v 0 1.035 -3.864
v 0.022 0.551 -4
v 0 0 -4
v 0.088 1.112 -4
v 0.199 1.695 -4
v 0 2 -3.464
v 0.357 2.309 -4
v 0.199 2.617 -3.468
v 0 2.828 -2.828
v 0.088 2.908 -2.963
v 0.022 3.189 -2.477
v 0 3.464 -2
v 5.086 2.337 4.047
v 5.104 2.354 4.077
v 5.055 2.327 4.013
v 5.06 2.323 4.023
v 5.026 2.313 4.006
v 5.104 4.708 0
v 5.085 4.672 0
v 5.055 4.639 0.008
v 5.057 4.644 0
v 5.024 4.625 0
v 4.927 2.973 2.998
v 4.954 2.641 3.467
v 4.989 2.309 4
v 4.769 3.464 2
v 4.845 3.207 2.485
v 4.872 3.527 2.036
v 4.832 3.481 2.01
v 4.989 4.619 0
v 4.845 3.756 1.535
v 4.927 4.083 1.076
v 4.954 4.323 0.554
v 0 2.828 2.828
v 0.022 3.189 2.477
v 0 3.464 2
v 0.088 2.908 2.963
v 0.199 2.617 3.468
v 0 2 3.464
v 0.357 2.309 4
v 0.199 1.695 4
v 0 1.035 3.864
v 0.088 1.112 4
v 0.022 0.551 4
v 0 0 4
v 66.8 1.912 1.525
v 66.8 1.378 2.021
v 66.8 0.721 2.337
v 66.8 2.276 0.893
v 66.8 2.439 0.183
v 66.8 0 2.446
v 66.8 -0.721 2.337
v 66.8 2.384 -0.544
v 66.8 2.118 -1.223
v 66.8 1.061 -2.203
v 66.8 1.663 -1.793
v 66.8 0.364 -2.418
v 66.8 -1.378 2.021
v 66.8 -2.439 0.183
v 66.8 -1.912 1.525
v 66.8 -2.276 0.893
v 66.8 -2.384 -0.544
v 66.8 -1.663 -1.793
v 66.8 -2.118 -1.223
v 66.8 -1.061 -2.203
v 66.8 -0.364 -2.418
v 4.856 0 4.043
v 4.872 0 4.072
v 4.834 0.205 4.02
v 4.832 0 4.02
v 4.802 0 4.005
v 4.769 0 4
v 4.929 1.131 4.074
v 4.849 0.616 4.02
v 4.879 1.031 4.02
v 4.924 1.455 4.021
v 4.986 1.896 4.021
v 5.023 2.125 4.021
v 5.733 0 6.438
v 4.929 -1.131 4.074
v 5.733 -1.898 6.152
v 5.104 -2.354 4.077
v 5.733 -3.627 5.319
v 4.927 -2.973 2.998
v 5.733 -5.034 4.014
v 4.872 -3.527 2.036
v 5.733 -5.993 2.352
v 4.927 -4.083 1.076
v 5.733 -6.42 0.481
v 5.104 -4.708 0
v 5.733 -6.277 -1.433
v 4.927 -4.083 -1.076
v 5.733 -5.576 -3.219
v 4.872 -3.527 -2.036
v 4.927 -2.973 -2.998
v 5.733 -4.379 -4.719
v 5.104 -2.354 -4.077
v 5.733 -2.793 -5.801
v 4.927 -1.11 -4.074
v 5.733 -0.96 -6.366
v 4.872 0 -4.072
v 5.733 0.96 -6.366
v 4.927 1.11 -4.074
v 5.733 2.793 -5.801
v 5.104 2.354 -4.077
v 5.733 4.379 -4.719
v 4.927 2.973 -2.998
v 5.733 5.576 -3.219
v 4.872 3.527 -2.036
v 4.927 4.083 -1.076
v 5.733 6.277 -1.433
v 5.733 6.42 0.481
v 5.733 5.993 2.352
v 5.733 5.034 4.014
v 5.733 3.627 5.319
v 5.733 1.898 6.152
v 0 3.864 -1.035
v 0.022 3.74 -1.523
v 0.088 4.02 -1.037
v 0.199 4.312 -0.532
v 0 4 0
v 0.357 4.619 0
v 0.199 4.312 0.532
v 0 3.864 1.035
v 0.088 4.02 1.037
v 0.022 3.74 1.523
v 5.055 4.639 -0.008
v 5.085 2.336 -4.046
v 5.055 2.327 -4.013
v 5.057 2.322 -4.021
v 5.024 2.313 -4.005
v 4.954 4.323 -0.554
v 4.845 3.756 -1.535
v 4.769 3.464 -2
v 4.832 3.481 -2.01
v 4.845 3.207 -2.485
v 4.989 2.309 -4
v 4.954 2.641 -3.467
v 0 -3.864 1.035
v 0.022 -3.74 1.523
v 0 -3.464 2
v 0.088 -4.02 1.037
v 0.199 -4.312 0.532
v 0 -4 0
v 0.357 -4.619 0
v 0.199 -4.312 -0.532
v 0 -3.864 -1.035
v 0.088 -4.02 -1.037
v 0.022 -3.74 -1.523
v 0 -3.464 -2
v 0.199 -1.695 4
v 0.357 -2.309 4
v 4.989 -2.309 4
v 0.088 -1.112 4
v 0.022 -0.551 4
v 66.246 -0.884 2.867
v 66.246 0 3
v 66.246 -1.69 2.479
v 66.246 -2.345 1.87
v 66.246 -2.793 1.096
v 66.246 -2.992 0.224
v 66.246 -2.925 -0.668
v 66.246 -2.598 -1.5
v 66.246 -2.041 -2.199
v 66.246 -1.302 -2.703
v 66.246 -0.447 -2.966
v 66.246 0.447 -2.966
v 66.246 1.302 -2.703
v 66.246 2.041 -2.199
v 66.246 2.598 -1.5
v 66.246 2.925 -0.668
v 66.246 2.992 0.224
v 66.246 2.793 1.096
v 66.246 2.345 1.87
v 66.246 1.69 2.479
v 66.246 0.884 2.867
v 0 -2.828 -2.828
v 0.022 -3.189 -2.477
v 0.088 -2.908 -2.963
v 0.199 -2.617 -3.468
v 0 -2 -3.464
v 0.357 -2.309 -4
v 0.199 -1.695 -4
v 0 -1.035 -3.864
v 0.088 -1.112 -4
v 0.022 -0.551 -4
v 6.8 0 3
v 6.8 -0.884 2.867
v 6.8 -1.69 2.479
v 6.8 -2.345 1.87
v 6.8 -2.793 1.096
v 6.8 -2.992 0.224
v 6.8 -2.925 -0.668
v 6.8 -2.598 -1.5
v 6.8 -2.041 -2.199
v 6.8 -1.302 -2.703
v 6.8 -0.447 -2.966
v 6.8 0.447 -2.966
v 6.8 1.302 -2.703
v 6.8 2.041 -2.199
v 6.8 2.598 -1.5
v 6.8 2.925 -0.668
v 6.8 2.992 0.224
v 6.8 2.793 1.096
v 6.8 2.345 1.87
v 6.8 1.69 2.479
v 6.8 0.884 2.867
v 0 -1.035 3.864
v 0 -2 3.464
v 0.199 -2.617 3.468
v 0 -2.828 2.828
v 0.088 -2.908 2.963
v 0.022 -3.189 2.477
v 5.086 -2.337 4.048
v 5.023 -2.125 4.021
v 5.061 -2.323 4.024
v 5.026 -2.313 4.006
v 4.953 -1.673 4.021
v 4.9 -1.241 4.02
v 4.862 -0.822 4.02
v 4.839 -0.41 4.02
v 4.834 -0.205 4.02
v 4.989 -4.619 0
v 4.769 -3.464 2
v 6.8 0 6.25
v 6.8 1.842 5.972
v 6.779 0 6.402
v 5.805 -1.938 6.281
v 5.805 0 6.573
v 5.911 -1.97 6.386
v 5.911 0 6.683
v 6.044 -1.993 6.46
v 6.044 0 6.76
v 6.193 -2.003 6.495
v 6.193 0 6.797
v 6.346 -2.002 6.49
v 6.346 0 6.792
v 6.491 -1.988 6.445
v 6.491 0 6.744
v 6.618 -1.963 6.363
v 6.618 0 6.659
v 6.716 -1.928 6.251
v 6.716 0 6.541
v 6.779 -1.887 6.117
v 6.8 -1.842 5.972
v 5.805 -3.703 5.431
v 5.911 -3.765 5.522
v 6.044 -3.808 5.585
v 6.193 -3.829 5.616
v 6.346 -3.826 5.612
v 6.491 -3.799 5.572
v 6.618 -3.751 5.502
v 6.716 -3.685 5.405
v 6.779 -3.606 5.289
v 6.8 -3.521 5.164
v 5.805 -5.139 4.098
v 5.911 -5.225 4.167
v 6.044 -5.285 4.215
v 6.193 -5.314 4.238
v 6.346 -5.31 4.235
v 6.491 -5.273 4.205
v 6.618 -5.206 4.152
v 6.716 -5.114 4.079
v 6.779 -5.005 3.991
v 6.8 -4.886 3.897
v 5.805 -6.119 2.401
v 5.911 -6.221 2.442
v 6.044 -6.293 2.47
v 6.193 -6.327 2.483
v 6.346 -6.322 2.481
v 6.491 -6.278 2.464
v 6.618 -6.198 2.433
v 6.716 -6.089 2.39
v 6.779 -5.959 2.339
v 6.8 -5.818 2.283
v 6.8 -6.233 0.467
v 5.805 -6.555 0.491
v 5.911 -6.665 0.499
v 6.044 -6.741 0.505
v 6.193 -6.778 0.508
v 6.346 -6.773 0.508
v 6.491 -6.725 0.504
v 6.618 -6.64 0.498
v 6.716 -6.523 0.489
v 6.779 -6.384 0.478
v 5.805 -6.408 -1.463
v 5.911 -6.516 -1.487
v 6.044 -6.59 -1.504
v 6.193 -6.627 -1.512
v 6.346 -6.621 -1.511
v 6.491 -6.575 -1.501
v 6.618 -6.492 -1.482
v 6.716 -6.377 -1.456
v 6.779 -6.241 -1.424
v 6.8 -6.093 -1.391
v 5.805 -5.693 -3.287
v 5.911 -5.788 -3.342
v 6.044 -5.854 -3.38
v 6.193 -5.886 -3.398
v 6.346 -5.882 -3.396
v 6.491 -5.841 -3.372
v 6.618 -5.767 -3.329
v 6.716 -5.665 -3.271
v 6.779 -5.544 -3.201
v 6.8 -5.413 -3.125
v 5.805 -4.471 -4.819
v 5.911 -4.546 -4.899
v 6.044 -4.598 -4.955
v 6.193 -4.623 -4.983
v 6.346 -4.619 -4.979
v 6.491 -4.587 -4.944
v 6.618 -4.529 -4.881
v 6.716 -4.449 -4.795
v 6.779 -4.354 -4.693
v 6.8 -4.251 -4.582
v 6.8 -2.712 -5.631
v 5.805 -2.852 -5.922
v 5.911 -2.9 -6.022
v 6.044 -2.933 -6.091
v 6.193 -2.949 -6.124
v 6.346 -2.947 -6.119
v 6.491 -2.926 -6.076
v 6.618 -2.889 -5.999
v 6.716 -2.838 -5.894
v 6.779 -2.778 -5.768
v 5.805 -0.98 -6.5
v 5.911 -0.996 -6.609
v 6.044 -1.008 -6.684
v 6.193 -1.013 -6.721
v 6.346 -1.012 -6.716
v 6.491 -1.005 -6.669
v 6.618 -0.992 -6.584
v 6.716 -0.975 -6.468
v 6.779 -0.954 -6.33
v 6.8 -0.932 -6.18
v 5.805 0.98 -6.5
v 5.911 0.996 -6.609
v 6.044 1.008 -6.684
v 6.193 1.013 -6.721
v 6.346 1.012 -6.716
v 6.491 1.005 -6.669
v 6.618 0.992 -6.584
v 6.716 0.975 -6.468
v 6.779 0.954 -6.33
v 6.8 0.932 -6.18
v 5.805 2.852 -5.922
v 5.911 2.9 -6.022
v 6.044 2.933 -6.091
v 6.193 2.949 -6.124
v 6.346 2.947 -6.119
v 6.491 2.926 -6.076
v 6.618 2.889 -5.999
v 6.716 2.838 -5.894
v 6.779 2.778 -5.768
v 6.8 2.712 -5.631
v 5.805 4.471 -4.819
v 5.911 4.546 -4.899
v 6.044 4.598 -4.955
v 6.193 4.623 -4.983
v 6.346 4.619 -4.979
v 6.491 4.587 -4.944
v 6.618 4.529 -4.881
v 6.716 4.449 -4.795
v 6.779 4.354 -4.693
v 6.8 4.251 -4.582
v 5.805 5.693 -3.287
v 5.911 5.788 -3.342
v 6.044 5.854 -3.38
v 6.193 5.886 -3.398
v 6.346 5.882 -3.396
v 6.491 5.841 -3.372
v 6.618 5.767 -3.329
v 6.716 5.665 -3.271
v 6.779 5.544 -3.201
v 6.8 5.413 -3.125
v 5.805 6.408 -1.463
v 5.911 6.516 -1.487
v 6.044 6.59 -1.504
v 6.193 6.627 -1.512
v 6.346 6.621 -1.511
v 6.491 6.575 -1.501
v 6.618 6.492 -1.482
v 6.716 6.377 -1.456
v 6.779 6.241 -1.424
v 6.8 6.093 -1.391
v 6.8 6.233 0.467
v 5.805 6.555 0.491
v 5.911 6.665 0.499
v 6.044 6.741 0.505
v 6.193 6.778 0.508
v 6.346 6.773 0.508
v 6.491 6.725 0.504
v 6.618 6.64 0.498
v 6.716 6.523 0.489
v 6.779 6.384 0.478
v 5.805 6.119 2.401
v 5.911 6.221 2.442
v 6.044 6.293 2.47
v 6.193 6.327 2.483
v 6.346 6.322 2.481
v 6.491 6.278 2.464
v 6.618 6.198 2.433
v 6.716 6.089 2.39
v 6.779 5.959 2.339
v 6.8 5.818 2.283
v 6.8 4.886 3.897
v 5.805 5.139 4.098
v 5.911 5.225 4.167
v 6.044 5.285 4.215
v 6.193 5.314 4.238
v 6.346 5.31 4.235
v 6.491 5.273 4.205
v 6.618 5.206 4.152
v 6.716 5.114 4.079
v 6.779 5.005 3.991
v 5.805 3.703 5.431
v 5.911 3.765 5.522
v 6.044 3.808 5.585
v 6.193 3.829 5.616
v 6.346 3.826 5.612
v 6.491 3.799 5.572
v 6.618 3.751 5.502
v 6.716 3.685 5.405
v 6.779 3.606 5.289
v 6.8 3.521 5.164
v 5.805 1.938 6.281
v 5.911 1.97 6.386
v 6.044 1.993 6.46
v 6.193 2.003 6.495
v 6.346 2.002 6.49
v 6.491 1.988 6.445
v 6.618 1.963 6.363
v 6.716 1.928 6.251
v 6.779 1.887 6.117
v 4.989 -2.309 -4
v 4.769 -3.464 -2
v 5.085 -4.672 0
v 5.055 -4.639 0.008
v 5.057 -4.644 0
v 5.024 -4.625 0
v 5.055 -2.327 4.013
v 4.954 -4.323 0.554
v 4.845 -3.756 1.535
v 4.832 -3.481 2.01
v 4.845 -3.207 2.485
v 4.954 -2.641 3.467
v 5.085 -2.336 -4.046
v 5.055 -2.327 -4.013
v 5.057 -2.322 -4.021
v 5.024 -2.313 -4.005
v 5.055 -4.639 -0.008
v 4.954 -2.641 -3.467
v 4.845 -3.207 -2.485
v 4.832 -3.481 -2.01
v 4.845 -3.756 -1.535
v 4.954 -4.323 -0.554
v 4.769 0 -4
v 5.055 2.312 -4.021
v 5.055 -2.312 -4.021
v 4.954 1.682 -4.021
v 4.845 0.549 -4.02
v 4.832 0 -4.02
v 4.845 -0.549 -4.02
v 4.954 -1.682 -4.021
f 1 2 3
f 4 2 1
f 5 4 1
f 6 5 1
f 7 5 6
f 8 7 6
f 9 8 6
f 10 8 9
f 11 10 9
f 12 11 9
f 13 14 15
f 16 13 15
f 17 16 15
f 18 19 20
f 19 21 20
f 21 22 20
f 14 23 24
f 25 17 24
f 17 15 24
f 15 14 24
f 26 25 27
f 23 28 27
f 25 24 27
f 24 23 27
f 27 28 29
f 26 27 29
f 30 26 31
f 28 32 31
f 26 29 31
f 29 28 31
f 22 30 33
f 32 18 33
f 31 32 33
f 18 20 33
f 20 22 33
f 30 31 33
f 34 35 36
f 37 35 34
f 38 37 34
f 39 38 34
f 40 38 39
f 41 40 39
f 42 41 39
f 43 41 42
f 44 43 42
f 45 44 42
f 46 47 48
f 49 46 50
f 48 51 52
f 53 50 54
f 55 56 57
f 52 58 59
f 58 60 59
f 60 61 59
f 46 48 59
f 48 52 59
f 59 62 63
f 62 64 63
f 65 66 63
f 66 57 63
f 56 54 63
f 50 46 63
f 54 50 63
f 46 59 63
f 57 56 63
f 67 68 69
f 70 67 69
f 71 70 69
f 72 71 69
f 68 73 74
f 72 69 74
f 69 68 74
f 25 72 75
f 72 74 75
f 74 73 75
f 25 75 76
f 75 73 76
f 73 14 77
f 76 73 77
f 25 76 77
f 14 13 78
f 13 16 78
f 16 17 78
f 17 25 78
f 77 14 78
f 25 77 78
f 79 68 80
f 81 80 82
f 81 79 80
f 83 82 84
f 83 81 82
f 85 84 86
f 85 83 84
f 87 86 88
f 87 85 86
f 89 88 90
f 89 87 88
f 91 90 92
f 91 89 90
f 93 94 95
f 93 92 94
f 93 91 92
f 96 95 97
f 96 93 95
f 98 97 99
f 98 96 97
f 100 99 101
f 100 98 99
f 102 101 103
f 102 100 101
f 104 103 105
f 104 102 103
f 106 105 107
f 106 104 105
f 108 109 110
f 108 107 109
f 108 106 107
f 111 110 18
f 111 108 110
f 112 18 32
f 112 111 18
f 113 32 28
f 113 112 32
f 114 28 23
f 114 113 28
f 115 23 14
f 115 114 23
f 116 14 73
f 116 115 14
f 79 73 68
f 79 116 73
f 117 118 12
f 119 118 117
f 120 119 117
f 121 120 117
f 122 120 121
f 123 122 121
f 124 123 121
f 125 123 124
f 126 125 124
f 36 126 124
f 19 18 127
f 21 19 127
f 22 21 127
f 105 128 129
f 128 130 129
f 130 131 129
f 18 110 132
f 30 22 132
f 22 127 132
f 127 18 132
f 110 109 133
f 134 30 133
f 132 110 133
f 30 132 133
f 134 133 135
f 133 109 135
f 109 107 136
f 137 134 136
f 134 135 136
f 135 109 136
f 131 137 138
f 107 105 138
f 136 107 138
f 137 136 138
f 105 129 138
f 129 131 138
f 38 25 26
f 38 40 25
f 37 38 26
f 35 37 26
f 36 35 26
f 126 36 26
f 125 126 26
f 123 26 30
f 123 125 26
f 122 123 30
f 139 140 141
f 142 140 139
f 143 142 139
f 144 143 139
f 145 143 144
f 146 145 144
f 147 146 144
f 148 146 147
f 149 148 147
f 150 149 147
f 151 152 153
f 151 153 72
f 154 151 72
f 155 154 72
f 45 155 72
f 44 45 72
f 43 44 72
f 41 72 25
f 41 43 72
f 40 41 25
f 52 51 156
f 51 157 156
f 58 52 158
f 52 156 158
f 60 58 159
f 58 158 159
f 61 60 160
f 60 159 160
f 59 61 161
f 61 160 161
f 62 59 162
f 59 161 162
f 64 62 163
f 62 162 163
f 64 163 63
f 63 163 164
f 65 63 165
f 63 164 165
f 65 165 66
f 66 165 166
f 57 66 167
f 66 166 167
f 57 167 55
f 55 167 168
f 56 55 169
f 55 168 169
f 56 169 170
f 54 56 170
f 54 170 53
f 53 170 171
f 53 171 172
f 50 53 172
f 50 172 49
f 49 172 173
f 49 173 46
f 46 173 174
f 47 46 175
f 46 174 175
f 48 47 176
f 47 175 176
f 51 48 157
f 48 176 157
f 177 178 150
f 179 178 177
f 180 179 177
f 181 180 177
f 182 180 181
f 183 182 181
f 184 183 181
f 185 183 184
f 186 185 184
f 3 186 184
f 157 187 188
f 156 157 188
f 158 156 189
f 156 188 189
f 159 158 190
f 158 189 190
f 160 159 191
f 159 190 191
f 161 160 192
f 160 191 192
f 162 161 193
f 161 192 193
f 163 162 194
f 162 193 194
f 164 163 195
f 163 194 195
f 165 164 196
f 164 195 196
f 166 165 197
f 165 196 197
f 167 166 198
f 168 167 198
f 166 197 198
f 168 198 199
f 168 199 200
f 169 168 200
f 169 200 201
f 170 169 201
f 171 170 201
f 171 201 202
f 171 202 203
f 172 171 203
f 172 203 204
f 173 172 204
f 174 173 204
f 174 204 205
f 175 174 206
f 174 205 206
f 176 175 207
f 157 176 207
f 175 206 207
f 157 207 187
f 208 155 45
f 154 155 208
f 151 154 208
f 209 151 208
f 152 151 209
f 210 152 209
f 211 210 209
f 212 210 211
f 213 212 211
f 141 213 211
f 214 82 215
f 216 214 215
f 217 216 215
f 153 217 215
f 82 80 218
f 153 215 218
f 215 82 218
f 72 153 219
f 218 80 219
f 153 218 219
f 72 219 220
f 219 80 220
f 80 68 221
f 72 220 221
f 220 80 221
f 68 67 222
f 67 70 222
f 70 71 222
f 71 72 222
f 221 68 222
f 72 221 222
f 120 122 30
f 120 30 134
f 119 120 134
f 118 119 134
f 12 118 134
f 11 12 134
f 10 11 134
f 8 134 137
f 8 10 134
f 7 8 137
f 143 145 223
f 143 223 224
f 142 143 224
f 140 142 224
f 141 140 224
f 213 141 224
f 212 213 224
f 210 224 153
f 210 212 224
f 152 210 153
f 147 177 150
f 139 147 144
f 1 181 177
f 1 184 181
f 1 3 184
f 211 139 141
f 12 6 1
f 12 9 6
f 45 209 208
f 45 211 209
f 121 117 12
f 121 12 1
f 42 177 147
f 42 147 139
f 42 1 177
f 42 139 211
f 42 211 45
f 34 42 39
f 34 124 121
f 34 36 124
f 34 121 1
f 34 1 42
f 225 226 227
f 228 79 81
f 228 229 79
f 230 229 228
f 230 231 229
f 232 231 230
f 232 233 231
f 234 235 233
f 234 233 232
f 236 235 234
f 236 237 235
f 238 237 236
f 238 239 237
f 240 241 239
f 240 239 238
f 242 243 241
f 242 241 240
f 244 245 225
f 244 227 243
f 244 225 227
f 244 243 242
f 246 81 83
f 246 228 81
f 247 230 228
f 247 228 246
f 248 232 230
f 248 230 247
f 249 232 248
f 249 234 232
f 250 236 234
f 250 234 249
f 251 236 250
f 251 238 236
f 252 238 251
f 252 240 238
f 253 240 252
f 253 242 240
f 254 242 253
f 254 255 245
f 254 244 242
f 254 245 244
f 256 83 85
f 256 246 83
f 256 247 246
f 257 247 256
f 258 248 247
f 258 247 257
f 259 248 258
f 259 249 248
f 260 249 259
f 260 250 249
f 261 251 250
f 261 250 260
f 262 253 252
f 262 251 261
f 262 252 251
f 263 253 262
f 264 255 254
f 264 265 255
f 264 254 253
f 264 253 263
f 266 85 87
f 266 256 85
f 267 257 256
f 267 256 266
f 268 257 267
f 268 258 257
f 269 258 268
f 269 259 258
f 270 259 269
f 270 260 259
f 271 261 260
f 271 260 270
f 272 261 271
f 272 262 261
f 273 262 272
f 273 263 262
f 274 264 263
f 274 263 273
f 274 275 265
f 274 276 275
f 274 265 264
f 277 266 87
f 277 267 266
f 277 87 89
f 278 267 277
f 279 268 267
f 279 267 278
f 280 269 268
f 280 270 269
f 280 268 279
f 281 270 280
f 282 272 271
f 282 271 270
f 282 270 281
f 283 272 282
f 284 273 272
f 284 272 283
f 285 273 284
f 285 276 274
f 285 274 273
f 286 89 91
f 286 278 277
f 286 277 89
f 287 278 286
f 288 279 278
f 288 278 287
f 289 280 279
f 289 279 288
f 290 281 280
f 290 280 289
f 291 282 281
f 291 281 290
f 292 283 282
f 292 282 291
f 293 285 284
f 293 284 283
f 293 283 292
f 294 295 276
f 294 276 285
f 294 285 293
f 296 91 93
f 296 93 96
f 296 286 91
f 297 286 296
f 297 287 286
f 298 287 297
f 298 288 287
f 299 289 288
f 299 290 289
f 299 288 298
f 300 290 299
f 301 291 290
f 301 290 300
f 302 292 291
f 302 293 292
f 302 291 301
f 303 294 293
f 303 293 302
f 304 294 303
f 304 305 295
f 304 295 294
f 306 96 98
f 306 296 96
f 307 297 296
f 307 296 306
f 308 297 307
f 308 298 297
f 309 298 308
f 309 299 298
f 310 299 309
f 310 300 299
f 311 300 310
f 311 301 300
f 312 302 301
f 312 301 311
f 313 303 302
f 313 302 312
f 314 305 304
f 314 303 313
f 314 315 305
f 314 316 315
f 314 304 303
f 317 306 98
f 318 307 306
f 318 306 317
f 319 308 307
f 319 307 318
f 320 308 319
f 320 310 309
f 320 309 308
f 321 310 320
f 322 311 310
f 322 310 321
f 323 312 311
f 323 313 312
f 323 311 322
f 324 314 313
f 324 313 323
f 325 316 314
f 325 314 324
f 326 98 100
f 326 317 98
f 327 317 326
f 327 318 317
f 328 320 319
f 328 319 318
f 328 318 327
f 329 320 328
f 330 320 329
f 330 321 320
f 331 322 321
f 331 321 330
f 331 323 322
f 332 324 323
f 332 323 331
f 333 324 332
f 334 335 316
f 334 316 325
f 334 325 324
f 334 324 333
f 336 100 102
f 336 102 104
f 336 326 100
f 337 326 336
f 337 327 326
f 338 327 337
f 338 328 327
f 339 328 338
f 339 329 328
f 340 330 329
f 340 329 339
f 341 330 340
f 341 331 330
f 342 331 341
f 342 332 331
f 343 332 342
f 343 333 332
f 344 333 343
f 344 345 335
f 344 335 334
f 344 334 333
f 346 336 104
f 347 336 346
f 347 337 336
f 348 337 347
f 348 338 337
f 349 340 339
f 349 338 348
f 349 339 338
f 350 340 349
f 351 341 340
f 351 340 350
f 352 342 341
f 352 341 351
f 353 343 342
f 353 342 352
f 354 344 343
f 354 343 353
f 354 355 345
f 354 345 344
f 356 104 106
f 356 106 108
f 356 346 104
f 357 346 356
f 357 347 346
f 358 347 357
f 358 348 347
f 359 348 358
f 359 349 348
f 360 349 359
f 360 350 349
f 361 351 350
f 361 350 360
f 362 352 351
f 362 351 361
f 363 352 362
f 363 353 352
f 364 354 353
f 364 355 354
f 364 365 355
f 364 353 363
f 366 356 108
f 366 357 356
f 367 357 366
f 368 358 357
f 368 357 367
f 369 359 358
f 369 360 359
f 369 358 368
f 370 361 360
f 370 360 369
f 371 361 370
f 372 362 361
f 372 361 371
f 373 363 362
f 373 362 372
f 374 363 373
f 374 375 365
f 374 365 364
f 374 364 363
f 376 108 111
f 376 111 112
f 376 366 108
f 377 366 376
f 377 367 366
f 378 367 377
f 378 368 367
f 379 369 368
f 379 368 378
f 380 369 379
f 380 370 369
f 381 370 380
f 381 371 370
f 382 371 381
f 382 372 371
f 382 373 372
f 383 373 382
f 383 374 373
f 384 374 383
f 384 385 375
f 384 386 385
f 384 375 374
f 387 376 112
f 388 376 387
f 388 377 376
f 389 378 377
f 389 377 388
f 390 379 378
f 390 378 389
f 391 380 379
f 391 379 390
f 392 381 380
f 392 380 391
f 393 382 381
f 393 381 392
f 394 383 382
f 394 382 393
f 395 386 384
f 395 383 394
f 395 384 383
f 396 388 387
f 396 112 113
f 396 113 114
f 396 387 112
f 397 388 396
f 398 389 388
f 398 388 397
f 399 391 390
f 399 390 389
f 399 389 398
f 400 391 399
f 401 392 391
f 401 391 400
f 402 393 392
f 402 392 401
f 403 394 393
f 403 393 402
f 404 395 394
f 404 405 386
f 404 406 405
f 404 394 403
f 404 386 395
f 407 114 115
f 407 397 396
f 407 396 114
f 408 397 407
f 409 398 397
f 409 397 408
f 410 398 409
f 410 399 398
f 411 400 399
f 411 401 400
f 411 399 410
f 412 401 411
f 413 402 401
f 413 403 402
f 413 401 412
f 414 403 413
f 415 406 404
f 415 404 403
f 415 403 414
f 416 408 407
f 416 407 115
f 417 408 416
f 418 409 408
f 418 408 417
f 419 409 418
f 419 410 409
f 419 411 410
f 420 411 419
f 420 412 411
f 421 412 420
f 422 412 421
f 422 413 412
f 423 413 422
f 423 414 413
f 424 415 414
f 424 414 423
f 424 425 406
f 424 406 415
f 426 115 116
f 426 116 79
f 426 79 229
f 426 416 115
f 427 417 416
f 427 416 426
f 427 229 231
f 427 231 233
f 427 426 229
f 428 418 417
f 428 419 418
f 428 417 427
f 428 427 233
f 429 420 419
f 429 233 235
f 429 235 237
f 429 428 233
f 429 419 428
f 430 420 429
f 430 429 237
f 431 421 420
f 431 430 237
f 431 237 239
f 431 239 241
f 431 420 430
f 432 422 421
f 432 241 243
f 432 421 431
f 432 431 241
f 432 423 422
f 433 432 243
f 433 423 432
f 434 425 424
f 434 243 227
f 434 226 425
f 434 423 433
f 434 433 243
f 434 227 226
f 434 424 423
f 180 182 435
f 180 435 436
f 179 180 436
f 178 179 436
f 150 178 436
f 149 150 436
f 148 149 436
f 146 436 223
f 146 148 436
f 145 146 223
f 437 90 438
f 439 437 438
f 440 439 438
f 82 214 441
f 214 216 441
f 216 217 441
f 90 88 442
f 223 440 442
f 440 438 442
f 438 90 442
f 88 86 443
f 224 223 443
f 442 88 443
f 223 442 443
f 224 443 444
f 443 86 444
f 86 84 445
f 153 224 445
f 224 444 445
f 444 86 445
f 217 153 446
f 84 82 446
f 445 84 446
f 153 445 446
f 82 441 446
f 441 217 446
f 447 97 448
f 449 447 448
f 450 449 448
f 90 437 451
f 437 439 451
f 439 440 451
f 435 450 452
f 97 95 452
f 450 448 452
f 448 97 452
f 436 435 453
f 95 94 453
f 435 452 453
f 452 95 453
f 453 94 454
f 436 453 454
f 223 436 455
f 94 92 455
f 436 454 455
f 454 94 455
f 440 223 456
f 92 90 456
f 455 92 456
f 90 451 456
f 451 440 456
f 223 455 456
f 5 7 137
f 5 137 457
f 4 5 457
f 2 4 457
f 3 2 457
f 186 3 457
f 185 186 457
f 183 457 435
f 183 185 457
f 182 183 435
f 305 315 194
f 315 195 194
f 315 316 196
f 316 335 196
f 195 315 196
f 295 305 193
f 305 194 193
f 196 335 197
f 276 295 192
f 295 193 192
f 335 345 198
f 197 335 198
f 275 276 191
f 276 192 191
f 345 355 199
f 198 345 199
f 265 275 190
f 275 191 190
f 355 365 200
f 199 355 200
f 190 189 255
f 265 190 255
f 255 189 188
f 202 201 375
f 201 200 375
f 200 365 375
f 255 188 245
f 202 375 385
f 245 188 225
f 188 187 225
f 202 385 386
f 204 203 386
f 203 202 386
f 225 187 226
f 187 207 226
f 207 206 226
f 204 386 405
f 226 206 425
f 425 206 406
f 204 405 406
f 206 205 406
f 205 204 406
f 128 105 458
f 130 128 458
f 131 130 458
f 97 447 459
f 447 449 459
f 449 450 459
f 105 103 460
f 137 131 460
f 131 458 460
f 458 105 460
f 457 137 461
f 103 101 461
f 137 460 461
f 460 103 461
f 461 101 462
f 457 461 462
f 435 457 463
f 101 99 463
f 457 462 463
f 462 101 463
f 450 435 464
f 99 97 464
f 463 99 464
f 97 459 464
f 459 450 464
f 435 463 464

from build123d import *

# Parameters (mm, degrees)
BASEHEAD_DEPTH    = 6.8
FLANGEHEXFILLET_R = 0.11


with BuildPart() as part:
    # Sketch1 → BaseHead (new body)
    with BuildSketch(Plane(origin=(0, 0, 0), x_dir=(0, 0, -1), z_dir=(1, 0, 0))):
        Polygon((4, 2.309401077), (4, -2.309401077), (0, -4.618802154), (-4, -2.309401077), (-4, 2.309401077), (0, 4.618802154), align=None)
    extrude(amount=BASEHEAD_DEPTH)

    # BodySke → BaseBody (revolve)
    with BuildSketch(Plane.XY, mode=Mode.PRIVATE) as basebody_sk:
        Polygon((0, 0), (66.8, 0), (66.8, 2.4455), (66.2455, 3), (0, 3), align=None)
    revolve(basebody_sk.sketch.rotate(Axis((0, 0, 0), (1, 0, 0)), 90), axis=Axis((0, 0, 0), (1, 0, 0)))  # turned: the seam where the file's is

    # Sketch3 → HeadChamfer (revolve, cut)
    with BuildSketch(Plane.XY, mode=Mode.PRIVATE) as headchamfer_sk:
        Polygon((0, 4), (3.244016936, 9.618802154), (3.244016936, 14.618802154), (-10, 14.618802154), (-10, 4), align=None)
    revolve(headchamfer_sk.sketch.rotate(Axis((0, 0, 0), (1, 0, 0)), 90), axis=Axis((0, 0, 0), (1, 0, 0)), mode=Mode.SUBTRACT)  # turned: the seam where the file's is

    # Sketch4 → Flange (revolve)
    with BuildSketch(Plane.XY, mode=Mode.PRIVATE) as flange_sk:
        with BuildLine():
            Line((3.389888261, 0), (5.733169059, 6.438111079))
            ThreePointArc((5.733169059, 6.438111079), (6.345506498, 6.791644264), (6.8, 6.25))
            Line((6.8, 6.25), (6.8, 0))
            Line((6.8, 0), (3.389888261, 0))
        make_face()
    revolve(flange_sk.sketch.rotate(Axis((0, 0, 0), (1, 0, 0)), 90), axis=Axis((0, 0, 0), (1, 0, 0)))  # turned: the seam where the file's is

    # FlangeHexFillet
    flangehexfillet_edges = [part.edges().sort_by_distance(p)[0] for p in [
        (4.845769198, 0, -4),
        (4.845769198, -3.464101615, -2),
        (4.905726696, 1.159737717, 4),
        (4.845769198, 3.464101615, 2),
        (4.845769198, 3.464101615, -2),
        (4.845769198, -3.464101615, 2),
        (4.905726696, -1.159737717, 4),
    ]]
    fillet(flangehexfillet_edges, radius=FLANGEHEXFILLET_R)


solid = part.part
